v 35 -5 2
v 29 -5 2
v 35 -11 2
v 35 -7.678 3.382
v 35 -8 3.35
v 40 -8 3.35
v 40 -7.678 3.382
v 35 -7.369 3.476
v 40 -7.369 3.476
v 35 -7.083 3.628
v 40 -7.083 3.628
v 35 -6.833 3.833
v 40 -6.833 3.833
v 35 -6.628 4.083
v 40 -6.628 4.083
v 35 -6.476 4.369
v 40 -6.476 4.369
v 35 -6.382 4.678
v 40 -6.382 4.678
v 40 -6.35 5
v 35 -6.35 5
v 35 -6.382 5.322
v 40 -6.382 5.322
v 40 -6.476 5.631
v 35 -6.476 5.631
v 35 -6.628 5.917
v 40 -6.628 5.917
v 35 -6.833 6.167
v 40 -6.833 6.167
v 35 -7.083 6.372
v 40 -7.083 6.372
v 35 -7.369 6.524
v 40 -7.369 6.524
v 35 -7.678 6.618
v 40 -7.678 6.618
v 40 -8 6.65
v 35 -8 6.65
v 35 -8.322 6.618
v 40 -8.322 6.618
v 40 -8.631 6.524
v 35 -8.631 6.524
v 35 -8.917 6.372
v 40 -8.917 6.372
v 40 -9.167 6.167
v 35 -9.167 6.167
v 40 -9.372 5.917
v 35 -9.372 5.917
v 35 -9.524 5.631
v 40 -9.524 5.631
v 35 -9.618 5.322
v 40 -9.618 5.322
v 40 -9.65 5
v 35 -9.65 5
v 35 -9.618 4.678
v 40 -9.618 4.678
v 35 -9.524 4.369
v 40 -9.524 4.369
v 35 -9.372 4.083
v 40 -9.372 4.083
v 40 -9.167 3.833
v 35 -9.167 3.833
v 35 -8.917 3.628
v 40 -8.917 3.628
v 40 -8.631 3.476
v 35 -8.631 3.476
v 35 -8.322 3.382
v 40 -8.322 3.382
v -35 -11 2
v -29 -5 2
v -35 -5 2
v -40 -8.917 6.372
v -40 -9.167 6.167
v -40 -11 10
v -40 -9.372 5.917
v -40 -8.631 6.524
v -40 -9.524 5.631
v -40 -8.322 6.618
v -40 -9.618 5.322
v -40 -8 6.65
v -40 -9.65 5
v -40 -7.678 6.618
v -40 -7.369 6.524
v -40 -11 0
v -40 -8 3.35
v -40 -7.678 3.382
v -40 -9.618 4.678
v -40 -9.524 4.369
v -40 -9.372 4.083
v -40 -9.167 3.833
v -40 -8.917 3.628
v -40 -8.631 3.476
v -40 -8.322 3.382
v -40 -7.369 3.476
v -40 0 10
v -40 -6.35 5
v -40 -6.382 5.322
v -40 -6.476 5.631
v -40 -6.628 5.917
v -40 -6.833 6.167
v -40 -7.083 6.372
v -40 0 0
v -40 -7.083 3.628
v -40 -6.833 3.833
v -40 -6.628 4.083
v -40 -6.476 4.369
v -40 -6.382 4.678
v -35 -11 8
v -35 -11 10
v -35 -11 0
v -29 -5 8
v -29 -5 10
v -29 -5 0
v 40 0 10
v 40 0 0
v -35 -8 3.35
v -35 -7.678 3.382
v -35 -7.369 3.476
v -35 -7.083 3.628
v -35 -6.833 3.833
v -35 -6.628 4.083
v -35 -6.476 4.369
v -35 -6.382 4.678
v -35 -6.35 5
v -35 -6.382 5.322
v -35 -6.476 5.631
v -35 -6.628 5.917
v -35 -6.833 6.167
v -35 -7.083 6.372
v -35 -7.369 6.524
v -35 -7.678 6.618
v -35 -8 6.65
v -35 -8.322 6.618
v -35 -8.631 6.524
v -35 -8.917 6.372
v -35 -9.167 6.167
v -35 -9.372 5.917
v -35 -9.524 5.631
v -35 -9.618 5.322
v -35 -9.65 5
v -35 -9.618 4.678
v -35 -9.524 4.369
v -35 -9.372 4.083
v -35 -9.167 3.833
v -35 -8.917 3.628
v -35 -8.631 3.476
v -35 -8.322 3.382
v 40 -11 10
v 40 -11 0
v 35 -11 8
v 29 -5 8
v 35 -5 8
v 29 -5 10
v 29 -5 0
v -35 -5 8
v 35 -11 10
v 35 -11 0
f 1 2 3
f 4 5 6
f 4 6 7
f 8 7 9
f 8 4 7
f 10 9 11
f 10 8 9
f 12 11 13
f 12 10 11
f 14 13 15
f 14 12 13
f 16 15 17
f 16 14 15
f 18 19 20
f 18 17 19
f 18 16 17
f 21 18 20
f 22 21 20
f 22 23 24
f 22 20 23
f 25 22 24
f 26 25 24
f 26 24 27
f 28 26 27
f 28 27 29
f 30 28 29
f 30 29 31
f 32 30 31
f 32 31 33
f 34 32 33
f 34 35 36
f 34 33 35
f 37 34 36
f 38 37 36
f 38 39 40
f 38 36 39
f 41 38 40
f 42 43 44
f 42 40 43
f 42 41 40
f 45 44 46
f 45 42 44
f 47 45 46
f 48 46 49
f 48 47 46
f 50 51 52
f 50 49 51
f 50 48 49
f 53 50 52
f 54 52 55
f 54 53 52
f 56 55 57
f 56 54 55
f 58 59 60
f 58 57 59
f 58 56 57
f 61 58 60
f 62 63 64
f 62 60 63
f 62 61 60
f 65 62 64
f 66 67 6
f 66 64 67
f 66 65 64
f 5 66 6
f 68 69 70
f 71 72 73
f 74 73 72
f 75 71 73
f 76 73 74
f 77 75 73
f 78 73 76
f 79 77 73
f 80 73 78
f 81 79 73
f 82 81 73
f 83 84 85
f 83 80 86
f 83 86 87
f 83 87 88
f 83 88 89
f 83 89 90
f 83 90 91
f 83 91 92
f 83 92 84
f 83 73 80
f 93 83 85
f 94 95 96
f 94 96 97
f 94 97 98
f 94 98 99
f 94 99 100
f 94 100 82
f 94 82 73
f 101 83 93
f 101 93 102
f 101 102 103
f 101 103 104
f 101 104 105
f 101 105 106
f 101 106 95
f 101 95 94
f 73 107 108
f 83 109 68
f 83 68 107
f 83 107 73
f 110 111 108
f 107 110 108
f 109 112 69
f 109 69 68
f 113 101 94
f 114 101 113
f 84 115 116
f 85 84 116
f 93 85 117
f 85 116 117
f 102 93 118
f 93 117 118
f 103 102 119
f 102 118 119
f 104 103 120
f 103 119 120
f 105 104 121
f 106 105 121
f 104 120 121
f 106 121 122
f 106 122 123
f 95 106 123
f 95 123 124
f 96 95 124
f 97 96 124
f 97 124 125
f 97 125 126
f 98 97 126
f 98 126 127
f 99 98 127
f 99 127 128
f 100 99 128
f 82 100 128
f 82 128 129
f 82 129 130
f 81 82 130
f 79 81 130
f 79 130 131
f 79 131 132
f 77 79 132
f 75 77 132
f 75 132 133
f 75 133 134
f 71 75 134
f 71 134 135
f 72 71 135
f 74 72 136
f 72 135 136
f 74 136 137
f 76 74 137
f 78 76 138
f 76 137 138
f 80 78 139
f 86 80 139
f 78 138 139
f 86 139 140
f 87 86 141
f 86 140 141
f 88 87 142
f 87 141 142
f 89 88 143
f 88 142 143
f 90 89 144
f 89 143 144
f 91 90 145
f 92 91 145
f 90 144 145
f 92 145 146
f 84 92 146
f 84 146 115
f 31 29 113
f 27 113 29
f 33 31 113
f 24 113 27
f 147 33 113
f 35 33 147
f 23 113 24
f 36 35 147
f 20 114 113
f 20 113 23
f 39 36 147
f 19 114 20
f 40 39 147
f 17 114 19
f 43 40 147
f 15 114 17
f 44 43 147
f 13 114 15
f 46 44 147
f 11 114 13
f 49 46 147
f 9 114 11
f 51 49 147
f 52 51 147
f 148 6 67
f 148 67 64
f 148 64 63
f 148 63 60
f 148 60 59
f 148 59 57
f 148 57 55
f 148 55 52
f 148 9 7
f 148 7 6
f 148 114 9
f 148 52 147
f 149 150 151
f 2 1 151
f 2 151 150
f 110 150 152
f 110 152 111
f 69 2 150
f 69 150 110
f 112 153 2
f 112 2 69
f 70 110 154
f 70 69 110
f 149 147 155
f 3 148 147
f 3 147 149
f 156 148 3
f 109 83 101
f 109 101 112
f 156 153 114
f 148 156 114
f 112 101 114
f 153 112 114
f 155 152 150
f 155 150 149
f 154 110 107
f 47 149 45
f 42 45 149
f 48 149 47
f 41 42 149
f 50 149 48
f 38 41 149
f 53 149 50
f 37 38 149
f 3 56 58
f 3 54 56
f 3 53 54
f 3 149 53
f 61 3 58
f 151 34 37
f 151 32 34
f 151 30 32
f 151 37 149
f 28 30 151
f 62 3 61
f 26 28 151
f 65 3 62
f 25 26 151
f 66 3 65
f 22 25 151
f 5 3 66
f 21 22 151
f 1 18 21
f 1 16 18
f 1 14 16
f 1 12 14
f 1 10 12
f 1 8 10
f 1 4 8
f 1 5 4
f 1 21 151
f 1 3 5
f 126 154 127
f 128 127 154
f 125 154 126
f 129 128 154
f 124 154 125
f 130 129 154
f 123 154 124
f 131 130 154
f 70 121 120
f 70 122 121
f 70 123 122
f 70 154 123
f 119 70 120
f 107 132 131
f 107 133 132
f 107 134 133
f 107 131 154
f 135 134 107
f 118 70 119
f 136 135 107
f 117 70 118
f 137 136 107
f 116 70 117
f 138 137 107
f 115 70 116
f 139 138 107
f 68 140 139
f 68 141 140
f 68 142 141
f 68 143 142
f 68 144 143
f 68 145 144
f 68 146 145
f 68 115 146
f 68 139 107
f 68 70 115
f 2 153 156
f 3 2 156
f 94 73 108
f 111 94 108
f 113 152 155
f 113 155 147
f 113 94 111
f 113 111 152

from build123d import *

# Parameters (mm, degrees)
EXTRUDE_2_DEPTH          = 10
SKETCH_3_R               = 1.65
CUT_EXTRUDE_1_DEPTH      = 76
CUT_EXTRUDE_1_DEPTH_BACK = 6
EXTRUDE_3_DEPTH          = 2
MIRROR_2_COPY_1_DEPTH    = 2


with BuildPart() as part:
    # 草图1 → 凸台-拉伸2 (new body)
    with BuildSketch(Plane.XY):
        Polygon((-40, 0), (40, 0), (40, -11), (35, -11), (35, -5), (-35, -5), (-35, -11), (-40, -11), align=None)
    extrude(amount=EXTRUDE_2_DEPTH)

    # 草图3 → 切除-拉伸1 (cut, two sides)
    with BuildSketch(Plane(origin=(-35, 0, 0), x_dir=(0, 0, -1), z_dir=(1, 0, 0))) as cut_extrude_1_sk:
        with Locations((-5, -8)):
            Circle(SKETCH_3_R)
    extrude(amount=CUT_EXTRUDE_1_DEPTH, mode=Mode.SUBTRACT)
    extrude(cut_extrude_1_sk.sketch, amount=-CUT_EXTRUDE_1_DEPTH_BACK, mode=Mode.SUBTRACT)

    # 草图4 → 凸台-拉伸3 (add)
    with BuildSketch(Plane(origin=(0, 0, 0), x_dir=(-1, 0, 0), z_dir=(0, 0, -1))):
        Polygon((29, -5), (35, -11), (35, -5), align=None)
    extrude_3 = extrude(amount=-EXTRUDE_3_DEPTH)

    # 镜向1: 凸台-拉伸3 across plane
    add(extrude_3.mirror(Plane.XY.offset(5)))

    # 镜向2: 凸台-拉伸3 across plane
    add(extrude_3.mirror(Plane(origin=(0, 0, 0), x_dir=(0, 0, 1), z_dir=(1, 0, 0))))

    # 镜向2 copy 1 sketch → 镜向2 copy 1 (add)
    with BuildSketch(Plane.XY.offset(10)):
        Polygon((29, -5), (35, -11), (35, -5), align=None)
    extrude(amount=-MIRROR_2_COPY_1_DEPTH)


solid = part.part
